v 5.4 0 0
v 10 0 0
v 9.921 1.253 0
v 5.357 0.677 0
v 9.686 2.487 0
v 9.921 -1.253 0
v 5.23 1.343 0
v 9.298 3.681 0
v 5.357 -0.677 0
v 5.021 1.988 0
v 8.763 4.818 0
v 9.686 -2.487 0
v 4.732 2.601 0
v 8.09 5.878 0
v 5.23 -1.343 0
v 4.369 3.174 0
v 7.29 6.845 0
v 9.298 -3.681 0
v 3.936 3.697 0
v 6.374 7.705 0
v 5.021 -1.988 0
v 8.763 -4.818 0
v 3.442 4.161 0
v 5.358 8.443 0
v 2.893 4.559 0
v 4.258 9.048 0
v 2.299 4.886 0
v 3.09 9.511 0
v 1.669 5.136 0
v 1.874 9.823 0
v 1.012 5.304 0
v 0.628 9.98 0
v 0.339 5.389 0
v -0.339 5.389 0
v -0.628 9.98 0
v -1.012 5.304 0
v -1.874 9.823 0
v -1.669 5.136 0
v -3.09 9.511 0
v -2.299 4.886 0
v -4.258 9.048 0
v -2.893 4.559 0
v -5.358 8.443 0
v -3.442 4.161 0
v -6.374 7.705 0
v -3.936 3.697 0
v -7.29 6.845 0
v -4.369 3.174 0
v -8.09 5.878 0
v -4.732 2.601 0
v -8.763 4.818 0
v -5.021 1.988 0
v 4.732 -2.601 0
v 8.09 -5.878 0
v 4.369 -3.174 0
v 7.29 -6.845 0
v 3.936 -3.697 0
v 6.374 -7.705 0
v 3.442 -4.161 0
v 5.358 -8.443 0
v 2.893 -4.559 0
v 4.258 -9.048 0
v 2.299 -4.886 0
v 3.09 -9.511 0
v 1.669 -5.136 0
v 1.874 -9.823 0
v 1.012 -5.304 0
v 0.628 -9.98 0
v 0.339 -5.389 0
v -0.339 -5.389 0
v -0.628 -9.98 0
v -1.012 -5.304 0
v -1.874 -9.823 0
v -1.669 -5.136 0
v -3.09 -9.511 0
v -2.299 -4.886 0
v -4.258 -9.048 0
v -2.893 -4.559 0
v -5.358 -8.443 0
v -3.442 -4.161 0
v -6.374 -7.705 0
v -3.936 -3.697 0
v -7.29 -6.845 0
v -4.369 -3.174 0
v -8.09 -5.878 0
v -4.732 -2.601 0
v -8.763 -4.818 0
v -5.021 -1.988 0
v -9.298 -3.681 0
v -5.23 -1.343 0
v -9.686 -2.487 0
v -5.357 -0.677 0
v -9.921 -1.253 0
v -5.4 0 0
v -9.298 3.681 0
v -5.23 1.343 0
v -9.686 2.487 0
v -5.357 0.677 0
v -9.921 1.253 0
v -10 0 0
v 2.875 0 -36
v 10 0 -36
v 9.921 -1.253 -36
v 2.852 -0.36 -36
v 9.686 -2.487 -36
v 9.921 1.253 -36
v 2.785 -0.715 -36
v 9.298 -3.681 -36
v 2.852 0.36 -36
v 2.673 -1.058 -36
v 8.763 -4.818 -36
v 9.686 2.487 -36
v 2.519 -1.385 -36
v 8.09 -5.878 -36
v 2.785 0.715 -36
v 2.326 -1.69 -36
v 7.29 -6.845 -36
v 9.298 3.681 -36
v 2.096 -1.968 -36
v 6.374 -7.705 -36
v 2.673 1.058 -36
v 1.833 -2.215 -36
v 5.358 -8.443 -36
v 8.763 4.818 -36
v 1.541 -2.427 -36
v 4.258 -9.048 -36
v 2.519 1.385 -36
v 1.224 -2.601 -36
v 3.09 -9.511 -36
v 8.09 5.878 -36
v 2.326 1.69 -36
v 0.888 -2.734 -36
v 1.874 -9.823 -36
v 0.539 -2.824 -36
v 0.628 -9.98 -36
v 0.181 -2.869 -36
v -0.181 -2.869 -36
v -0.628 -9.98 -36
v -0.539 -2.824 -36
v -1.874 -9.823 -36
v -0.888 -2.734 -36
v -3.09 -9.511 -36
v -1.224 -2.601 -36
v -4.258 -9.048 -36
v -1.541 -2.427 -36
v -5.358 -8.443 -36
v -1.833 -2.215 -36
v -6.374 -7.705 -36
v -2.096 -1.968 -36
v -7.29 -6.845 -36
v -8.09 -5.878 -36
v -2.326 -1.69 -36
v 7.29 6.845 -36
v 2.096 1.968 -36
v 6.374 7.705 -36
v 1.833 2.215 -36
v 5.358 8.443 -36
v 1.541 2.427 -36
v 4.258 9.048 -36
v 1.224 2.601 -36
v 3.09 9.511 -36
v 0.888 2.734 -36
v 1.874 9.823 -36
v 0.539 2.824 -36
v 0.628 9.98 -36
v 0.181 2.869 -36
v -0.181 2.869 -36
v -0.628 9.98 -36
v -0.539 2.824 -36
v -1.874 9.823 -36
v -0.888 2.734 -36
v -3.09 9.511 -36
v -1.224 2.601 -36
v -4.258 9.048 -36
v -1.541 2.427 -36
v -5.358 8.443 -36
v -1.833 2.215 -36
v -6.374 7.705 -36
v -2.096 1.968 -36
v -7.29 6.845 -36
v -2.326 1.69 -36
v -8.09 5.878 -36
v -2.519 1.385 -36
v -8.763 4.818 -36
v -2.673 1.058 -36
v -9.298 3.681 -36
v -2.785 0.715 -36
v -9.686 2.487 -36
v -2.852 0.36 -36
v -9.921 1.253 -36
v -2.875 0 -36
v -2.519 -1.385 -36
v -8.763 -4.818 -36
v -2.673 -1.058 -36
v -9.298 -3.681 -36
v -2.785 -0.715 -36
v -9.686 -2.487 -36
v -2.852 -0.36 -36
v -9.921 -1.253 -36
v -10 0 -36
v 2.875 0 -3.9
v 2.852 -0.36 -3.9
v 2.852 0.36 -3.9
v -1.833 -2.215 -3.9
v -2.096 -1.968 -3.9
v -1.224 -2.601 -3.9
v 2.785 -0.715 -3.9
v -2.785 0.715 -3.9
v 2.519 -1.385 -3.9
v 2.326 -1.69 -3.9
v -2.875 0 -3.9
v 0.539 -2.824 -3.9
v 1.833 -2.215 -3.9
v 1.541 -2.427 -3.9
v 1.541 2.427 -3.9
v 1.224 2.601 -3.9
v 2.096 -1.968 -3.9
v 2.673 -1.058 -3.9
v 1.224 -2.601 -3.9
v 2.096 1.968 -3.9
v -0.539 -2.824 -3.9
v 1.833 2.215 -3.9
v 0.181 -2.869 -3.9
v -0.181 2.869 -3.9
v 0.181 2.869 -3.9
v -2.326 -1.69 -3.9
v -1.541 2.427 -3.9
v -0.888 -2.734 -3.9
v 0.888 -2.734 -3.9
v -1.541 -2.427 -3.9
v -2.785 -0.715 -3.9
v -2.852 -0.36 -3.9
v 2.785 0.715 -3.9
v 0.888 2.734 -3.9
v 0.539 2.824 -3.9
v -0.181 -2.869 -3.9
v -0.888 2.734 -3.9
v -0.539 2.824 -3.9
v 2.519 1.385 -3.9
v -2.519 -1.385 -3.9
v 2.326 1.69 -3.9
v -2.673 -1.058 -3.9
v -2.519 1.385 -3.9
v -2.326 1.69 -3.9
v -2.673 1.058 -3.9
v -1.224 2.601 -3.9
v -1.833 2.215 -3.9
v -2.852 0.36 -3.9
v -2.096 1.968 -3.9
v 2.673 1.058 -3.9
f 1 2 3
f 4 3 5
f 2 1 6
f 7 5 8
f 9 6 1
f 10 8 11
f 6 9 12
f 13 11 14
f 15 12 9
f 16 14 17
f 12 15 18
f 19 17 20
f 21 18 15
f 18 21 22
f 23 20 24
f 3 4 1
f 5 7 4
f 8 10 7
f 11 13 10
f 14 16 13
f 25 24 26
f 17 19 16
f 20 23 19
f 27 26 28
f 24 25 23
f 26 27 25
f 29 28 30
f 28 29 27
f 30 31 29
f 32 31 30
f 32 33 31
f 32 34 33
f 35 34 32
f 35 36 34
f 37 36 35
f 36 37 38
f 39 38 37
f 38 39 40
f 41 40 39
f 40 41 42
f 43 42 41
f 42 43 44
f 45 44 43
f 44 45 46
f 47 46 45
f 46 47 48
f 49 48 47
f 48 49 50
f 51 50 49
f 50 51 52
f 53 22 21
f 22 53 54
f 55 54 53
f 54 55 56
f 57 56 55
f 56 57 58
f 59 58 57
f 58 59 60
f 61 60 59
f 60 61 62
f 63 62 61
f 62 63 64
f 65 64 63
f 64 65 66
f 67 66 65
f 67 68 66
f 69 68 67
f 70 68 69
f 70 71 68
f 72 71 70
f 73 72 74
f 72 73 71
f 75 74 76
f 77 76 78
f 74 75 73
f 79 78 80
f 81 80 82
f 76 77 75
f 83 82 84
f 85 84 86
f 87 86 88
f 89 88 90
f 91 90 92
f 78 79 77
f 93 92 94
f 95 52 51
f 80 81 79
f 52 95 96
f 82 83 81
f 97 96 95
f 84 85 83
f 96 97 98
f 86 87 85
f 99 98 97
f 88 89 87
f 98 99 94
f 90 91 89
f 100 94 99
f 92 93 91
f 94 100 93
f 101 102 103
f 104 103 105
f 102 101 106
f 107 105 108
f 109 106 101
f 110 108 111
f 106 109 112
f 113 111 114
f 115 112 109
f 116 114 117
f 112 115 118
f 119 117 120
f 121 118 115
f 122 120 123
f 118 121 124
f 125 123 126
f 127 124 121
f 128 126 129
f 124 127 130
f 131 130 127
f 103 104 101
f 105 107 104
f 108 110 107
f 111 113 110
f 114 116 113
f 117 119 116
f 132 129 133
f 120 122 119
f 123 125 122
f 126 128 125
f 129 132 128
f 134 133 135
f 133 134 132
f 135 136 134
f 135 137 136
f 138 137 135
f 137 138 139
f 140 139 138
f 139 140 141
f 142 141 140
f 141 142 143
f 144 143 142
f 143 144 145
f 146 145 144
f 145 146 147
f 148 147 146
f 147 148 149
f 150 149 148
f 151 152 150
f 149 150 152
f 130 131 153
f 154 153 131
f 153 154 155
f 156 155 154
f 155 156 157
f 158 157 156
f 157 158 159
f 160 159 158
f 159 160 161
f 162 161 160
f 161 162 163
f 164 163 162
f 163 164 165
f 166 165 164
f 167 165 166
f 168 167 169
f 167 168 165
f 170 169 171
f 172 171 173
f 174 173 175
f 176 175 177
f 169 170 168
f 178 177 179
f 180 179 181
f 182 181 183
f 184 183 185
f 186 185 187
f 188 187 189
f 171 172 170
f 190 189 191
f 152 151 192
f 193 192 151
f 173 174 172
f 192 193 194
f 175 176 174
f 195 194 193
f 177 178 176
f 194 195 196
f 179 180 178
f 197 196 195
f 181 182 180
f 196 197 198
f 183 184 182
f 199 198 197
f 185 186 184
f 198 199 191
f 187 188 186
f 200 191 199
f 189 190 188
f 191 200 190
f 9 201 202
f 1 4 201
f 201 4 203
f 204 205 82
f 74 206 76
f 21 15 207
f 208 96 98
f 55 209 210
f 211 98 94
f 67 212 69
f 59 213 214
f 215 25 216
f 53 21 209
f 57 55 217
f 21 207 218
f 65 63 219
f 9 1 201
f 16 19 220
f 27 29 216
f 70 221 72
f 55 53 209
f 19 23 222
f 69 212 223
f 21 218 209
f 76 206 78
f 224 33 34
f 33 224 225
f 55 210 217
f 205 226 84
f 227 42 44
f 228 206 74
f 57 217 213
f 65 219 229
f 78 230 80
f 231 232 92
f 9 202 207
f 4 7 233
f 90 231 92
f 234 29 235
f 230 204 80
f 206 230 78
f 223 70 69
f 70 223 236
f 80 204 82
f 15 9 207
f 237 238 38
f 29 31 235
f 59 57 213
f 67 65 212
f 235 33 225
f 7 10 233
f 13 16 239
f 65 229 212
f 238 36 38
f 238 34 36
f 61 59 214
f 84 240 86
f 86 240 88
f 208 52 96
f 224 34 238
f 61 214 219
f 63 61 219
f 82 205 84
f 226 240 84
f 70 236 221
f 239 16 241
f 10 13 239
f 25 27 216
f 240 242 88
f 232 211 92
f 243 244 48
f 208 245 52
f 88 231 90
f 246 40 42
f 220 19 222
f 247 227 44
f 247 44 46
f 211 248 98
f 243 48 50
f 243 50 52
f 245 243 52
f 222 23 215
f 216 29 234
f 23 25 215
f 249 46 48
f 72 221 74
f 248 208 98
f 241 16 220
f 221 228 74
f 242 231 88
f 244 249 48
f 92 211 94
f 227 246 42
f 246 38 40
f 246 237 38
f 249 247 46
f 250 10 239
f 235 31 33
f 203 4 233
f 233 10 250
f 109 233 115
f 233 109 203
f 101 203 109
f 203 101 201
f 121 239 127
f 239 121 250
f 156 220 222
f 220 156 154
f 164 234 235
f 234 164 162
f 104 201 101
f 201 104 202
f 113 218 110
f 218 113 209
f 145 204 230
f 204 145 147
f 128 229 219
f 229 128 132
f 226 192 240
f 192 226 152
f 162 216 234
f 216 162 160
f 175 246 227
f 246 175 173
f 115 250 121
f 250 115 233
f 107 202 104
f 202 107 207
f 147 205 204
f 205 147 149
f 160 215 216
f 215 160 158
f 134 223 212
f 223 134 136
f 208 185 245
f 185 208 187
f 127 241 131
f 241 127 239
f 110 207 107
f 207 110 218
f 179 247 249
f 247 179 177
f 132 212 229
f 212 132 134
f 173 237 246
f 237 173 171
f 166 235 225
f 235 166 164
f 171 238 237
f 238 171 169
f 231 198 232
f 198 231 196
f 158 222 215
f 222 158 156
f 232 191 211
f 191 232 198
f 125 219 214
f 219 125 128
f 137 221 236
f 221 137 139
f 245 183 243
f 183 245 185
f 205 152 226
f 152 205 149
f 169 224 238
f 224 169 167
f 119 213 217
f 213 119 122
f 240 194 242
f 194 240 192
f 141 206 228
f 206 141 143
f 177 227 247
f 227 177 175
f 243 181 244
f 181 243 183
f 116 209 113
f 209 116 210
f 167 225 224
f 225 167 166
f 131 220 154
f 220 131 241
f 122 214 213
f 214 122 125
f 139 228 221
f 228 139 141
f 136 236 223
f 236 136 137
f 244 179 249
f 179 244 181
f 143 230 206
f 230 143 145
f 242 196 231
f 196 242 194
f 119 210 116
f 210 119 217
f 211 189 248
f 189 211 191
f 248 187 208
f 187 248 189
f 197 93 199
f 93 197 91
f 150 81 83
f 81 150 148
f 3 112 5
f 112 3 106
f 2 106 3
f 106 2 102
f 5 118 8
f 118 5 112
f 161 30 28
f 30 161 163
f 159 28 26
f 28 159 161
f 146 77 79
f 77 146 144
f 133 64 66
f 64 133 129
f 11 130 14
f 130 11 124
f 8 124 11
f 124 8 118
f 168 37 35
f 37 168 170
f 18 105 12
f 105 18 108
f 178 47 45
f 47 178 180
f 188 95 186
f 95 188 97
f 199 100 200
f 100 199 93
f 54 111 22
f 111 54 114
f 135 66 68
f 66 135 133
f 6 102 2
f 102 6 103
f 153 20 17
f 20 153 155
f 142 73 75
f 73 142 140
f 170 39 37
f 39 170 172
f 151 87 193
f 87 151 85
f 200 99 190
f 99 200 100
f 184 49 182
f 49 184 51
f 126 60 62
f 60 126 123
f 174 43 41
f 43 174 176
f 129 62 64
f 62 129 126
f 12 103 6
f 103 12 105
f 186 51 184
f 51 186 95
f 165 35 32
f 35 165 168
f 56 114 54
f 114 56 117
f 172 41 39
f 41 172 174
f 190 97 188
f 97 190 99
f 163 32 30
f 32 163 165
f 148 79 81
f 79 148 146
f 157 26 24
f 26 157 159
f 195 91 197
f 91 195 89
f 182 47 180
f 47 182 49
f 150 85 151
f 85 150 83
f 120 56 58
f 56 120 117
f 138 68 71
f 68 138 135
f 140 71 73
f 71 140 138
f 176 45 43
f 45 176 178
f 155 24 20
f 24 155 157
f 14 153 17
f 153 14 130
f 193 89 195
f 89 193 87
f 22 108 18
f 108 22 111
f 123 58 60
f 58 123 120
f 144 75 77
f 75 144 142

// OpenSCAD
$fn = 50;


difference() {
	union() {
		translate(v = [0, 0, -36.0000000000]) {
			cylinder(h = 36, r = 10.0000000000);
		}
		cylinder(h = 0, r = 20.0000000000);
	}
	union() {
		translate(v = [0, 0, 0]) {
			rotate(a = [0, 0, 0]) {
				difference() {
					union() {
						#translate(v = [0, 0, -36.0000000000]) {
							cylinder(h = 36, r = 2.6000000000);
						}
						#translate(v = [0, 0, -3.9000000000]) {
							cylinder(h = 3.9000000000, r1 = 2.8750000000, r2 = 5.4000000000);
						}
						#translate(v = [0, 0, -36.0000000000]) {
							cylinder(h = 36, r = 2.8750000000);
						}
						#translate(v = [0, 0, -36.0000000000]) {
							cylinder(h = 36, r = 2.6000000000);
						}
					}
					union();
				}
			}
		}
	}
}
